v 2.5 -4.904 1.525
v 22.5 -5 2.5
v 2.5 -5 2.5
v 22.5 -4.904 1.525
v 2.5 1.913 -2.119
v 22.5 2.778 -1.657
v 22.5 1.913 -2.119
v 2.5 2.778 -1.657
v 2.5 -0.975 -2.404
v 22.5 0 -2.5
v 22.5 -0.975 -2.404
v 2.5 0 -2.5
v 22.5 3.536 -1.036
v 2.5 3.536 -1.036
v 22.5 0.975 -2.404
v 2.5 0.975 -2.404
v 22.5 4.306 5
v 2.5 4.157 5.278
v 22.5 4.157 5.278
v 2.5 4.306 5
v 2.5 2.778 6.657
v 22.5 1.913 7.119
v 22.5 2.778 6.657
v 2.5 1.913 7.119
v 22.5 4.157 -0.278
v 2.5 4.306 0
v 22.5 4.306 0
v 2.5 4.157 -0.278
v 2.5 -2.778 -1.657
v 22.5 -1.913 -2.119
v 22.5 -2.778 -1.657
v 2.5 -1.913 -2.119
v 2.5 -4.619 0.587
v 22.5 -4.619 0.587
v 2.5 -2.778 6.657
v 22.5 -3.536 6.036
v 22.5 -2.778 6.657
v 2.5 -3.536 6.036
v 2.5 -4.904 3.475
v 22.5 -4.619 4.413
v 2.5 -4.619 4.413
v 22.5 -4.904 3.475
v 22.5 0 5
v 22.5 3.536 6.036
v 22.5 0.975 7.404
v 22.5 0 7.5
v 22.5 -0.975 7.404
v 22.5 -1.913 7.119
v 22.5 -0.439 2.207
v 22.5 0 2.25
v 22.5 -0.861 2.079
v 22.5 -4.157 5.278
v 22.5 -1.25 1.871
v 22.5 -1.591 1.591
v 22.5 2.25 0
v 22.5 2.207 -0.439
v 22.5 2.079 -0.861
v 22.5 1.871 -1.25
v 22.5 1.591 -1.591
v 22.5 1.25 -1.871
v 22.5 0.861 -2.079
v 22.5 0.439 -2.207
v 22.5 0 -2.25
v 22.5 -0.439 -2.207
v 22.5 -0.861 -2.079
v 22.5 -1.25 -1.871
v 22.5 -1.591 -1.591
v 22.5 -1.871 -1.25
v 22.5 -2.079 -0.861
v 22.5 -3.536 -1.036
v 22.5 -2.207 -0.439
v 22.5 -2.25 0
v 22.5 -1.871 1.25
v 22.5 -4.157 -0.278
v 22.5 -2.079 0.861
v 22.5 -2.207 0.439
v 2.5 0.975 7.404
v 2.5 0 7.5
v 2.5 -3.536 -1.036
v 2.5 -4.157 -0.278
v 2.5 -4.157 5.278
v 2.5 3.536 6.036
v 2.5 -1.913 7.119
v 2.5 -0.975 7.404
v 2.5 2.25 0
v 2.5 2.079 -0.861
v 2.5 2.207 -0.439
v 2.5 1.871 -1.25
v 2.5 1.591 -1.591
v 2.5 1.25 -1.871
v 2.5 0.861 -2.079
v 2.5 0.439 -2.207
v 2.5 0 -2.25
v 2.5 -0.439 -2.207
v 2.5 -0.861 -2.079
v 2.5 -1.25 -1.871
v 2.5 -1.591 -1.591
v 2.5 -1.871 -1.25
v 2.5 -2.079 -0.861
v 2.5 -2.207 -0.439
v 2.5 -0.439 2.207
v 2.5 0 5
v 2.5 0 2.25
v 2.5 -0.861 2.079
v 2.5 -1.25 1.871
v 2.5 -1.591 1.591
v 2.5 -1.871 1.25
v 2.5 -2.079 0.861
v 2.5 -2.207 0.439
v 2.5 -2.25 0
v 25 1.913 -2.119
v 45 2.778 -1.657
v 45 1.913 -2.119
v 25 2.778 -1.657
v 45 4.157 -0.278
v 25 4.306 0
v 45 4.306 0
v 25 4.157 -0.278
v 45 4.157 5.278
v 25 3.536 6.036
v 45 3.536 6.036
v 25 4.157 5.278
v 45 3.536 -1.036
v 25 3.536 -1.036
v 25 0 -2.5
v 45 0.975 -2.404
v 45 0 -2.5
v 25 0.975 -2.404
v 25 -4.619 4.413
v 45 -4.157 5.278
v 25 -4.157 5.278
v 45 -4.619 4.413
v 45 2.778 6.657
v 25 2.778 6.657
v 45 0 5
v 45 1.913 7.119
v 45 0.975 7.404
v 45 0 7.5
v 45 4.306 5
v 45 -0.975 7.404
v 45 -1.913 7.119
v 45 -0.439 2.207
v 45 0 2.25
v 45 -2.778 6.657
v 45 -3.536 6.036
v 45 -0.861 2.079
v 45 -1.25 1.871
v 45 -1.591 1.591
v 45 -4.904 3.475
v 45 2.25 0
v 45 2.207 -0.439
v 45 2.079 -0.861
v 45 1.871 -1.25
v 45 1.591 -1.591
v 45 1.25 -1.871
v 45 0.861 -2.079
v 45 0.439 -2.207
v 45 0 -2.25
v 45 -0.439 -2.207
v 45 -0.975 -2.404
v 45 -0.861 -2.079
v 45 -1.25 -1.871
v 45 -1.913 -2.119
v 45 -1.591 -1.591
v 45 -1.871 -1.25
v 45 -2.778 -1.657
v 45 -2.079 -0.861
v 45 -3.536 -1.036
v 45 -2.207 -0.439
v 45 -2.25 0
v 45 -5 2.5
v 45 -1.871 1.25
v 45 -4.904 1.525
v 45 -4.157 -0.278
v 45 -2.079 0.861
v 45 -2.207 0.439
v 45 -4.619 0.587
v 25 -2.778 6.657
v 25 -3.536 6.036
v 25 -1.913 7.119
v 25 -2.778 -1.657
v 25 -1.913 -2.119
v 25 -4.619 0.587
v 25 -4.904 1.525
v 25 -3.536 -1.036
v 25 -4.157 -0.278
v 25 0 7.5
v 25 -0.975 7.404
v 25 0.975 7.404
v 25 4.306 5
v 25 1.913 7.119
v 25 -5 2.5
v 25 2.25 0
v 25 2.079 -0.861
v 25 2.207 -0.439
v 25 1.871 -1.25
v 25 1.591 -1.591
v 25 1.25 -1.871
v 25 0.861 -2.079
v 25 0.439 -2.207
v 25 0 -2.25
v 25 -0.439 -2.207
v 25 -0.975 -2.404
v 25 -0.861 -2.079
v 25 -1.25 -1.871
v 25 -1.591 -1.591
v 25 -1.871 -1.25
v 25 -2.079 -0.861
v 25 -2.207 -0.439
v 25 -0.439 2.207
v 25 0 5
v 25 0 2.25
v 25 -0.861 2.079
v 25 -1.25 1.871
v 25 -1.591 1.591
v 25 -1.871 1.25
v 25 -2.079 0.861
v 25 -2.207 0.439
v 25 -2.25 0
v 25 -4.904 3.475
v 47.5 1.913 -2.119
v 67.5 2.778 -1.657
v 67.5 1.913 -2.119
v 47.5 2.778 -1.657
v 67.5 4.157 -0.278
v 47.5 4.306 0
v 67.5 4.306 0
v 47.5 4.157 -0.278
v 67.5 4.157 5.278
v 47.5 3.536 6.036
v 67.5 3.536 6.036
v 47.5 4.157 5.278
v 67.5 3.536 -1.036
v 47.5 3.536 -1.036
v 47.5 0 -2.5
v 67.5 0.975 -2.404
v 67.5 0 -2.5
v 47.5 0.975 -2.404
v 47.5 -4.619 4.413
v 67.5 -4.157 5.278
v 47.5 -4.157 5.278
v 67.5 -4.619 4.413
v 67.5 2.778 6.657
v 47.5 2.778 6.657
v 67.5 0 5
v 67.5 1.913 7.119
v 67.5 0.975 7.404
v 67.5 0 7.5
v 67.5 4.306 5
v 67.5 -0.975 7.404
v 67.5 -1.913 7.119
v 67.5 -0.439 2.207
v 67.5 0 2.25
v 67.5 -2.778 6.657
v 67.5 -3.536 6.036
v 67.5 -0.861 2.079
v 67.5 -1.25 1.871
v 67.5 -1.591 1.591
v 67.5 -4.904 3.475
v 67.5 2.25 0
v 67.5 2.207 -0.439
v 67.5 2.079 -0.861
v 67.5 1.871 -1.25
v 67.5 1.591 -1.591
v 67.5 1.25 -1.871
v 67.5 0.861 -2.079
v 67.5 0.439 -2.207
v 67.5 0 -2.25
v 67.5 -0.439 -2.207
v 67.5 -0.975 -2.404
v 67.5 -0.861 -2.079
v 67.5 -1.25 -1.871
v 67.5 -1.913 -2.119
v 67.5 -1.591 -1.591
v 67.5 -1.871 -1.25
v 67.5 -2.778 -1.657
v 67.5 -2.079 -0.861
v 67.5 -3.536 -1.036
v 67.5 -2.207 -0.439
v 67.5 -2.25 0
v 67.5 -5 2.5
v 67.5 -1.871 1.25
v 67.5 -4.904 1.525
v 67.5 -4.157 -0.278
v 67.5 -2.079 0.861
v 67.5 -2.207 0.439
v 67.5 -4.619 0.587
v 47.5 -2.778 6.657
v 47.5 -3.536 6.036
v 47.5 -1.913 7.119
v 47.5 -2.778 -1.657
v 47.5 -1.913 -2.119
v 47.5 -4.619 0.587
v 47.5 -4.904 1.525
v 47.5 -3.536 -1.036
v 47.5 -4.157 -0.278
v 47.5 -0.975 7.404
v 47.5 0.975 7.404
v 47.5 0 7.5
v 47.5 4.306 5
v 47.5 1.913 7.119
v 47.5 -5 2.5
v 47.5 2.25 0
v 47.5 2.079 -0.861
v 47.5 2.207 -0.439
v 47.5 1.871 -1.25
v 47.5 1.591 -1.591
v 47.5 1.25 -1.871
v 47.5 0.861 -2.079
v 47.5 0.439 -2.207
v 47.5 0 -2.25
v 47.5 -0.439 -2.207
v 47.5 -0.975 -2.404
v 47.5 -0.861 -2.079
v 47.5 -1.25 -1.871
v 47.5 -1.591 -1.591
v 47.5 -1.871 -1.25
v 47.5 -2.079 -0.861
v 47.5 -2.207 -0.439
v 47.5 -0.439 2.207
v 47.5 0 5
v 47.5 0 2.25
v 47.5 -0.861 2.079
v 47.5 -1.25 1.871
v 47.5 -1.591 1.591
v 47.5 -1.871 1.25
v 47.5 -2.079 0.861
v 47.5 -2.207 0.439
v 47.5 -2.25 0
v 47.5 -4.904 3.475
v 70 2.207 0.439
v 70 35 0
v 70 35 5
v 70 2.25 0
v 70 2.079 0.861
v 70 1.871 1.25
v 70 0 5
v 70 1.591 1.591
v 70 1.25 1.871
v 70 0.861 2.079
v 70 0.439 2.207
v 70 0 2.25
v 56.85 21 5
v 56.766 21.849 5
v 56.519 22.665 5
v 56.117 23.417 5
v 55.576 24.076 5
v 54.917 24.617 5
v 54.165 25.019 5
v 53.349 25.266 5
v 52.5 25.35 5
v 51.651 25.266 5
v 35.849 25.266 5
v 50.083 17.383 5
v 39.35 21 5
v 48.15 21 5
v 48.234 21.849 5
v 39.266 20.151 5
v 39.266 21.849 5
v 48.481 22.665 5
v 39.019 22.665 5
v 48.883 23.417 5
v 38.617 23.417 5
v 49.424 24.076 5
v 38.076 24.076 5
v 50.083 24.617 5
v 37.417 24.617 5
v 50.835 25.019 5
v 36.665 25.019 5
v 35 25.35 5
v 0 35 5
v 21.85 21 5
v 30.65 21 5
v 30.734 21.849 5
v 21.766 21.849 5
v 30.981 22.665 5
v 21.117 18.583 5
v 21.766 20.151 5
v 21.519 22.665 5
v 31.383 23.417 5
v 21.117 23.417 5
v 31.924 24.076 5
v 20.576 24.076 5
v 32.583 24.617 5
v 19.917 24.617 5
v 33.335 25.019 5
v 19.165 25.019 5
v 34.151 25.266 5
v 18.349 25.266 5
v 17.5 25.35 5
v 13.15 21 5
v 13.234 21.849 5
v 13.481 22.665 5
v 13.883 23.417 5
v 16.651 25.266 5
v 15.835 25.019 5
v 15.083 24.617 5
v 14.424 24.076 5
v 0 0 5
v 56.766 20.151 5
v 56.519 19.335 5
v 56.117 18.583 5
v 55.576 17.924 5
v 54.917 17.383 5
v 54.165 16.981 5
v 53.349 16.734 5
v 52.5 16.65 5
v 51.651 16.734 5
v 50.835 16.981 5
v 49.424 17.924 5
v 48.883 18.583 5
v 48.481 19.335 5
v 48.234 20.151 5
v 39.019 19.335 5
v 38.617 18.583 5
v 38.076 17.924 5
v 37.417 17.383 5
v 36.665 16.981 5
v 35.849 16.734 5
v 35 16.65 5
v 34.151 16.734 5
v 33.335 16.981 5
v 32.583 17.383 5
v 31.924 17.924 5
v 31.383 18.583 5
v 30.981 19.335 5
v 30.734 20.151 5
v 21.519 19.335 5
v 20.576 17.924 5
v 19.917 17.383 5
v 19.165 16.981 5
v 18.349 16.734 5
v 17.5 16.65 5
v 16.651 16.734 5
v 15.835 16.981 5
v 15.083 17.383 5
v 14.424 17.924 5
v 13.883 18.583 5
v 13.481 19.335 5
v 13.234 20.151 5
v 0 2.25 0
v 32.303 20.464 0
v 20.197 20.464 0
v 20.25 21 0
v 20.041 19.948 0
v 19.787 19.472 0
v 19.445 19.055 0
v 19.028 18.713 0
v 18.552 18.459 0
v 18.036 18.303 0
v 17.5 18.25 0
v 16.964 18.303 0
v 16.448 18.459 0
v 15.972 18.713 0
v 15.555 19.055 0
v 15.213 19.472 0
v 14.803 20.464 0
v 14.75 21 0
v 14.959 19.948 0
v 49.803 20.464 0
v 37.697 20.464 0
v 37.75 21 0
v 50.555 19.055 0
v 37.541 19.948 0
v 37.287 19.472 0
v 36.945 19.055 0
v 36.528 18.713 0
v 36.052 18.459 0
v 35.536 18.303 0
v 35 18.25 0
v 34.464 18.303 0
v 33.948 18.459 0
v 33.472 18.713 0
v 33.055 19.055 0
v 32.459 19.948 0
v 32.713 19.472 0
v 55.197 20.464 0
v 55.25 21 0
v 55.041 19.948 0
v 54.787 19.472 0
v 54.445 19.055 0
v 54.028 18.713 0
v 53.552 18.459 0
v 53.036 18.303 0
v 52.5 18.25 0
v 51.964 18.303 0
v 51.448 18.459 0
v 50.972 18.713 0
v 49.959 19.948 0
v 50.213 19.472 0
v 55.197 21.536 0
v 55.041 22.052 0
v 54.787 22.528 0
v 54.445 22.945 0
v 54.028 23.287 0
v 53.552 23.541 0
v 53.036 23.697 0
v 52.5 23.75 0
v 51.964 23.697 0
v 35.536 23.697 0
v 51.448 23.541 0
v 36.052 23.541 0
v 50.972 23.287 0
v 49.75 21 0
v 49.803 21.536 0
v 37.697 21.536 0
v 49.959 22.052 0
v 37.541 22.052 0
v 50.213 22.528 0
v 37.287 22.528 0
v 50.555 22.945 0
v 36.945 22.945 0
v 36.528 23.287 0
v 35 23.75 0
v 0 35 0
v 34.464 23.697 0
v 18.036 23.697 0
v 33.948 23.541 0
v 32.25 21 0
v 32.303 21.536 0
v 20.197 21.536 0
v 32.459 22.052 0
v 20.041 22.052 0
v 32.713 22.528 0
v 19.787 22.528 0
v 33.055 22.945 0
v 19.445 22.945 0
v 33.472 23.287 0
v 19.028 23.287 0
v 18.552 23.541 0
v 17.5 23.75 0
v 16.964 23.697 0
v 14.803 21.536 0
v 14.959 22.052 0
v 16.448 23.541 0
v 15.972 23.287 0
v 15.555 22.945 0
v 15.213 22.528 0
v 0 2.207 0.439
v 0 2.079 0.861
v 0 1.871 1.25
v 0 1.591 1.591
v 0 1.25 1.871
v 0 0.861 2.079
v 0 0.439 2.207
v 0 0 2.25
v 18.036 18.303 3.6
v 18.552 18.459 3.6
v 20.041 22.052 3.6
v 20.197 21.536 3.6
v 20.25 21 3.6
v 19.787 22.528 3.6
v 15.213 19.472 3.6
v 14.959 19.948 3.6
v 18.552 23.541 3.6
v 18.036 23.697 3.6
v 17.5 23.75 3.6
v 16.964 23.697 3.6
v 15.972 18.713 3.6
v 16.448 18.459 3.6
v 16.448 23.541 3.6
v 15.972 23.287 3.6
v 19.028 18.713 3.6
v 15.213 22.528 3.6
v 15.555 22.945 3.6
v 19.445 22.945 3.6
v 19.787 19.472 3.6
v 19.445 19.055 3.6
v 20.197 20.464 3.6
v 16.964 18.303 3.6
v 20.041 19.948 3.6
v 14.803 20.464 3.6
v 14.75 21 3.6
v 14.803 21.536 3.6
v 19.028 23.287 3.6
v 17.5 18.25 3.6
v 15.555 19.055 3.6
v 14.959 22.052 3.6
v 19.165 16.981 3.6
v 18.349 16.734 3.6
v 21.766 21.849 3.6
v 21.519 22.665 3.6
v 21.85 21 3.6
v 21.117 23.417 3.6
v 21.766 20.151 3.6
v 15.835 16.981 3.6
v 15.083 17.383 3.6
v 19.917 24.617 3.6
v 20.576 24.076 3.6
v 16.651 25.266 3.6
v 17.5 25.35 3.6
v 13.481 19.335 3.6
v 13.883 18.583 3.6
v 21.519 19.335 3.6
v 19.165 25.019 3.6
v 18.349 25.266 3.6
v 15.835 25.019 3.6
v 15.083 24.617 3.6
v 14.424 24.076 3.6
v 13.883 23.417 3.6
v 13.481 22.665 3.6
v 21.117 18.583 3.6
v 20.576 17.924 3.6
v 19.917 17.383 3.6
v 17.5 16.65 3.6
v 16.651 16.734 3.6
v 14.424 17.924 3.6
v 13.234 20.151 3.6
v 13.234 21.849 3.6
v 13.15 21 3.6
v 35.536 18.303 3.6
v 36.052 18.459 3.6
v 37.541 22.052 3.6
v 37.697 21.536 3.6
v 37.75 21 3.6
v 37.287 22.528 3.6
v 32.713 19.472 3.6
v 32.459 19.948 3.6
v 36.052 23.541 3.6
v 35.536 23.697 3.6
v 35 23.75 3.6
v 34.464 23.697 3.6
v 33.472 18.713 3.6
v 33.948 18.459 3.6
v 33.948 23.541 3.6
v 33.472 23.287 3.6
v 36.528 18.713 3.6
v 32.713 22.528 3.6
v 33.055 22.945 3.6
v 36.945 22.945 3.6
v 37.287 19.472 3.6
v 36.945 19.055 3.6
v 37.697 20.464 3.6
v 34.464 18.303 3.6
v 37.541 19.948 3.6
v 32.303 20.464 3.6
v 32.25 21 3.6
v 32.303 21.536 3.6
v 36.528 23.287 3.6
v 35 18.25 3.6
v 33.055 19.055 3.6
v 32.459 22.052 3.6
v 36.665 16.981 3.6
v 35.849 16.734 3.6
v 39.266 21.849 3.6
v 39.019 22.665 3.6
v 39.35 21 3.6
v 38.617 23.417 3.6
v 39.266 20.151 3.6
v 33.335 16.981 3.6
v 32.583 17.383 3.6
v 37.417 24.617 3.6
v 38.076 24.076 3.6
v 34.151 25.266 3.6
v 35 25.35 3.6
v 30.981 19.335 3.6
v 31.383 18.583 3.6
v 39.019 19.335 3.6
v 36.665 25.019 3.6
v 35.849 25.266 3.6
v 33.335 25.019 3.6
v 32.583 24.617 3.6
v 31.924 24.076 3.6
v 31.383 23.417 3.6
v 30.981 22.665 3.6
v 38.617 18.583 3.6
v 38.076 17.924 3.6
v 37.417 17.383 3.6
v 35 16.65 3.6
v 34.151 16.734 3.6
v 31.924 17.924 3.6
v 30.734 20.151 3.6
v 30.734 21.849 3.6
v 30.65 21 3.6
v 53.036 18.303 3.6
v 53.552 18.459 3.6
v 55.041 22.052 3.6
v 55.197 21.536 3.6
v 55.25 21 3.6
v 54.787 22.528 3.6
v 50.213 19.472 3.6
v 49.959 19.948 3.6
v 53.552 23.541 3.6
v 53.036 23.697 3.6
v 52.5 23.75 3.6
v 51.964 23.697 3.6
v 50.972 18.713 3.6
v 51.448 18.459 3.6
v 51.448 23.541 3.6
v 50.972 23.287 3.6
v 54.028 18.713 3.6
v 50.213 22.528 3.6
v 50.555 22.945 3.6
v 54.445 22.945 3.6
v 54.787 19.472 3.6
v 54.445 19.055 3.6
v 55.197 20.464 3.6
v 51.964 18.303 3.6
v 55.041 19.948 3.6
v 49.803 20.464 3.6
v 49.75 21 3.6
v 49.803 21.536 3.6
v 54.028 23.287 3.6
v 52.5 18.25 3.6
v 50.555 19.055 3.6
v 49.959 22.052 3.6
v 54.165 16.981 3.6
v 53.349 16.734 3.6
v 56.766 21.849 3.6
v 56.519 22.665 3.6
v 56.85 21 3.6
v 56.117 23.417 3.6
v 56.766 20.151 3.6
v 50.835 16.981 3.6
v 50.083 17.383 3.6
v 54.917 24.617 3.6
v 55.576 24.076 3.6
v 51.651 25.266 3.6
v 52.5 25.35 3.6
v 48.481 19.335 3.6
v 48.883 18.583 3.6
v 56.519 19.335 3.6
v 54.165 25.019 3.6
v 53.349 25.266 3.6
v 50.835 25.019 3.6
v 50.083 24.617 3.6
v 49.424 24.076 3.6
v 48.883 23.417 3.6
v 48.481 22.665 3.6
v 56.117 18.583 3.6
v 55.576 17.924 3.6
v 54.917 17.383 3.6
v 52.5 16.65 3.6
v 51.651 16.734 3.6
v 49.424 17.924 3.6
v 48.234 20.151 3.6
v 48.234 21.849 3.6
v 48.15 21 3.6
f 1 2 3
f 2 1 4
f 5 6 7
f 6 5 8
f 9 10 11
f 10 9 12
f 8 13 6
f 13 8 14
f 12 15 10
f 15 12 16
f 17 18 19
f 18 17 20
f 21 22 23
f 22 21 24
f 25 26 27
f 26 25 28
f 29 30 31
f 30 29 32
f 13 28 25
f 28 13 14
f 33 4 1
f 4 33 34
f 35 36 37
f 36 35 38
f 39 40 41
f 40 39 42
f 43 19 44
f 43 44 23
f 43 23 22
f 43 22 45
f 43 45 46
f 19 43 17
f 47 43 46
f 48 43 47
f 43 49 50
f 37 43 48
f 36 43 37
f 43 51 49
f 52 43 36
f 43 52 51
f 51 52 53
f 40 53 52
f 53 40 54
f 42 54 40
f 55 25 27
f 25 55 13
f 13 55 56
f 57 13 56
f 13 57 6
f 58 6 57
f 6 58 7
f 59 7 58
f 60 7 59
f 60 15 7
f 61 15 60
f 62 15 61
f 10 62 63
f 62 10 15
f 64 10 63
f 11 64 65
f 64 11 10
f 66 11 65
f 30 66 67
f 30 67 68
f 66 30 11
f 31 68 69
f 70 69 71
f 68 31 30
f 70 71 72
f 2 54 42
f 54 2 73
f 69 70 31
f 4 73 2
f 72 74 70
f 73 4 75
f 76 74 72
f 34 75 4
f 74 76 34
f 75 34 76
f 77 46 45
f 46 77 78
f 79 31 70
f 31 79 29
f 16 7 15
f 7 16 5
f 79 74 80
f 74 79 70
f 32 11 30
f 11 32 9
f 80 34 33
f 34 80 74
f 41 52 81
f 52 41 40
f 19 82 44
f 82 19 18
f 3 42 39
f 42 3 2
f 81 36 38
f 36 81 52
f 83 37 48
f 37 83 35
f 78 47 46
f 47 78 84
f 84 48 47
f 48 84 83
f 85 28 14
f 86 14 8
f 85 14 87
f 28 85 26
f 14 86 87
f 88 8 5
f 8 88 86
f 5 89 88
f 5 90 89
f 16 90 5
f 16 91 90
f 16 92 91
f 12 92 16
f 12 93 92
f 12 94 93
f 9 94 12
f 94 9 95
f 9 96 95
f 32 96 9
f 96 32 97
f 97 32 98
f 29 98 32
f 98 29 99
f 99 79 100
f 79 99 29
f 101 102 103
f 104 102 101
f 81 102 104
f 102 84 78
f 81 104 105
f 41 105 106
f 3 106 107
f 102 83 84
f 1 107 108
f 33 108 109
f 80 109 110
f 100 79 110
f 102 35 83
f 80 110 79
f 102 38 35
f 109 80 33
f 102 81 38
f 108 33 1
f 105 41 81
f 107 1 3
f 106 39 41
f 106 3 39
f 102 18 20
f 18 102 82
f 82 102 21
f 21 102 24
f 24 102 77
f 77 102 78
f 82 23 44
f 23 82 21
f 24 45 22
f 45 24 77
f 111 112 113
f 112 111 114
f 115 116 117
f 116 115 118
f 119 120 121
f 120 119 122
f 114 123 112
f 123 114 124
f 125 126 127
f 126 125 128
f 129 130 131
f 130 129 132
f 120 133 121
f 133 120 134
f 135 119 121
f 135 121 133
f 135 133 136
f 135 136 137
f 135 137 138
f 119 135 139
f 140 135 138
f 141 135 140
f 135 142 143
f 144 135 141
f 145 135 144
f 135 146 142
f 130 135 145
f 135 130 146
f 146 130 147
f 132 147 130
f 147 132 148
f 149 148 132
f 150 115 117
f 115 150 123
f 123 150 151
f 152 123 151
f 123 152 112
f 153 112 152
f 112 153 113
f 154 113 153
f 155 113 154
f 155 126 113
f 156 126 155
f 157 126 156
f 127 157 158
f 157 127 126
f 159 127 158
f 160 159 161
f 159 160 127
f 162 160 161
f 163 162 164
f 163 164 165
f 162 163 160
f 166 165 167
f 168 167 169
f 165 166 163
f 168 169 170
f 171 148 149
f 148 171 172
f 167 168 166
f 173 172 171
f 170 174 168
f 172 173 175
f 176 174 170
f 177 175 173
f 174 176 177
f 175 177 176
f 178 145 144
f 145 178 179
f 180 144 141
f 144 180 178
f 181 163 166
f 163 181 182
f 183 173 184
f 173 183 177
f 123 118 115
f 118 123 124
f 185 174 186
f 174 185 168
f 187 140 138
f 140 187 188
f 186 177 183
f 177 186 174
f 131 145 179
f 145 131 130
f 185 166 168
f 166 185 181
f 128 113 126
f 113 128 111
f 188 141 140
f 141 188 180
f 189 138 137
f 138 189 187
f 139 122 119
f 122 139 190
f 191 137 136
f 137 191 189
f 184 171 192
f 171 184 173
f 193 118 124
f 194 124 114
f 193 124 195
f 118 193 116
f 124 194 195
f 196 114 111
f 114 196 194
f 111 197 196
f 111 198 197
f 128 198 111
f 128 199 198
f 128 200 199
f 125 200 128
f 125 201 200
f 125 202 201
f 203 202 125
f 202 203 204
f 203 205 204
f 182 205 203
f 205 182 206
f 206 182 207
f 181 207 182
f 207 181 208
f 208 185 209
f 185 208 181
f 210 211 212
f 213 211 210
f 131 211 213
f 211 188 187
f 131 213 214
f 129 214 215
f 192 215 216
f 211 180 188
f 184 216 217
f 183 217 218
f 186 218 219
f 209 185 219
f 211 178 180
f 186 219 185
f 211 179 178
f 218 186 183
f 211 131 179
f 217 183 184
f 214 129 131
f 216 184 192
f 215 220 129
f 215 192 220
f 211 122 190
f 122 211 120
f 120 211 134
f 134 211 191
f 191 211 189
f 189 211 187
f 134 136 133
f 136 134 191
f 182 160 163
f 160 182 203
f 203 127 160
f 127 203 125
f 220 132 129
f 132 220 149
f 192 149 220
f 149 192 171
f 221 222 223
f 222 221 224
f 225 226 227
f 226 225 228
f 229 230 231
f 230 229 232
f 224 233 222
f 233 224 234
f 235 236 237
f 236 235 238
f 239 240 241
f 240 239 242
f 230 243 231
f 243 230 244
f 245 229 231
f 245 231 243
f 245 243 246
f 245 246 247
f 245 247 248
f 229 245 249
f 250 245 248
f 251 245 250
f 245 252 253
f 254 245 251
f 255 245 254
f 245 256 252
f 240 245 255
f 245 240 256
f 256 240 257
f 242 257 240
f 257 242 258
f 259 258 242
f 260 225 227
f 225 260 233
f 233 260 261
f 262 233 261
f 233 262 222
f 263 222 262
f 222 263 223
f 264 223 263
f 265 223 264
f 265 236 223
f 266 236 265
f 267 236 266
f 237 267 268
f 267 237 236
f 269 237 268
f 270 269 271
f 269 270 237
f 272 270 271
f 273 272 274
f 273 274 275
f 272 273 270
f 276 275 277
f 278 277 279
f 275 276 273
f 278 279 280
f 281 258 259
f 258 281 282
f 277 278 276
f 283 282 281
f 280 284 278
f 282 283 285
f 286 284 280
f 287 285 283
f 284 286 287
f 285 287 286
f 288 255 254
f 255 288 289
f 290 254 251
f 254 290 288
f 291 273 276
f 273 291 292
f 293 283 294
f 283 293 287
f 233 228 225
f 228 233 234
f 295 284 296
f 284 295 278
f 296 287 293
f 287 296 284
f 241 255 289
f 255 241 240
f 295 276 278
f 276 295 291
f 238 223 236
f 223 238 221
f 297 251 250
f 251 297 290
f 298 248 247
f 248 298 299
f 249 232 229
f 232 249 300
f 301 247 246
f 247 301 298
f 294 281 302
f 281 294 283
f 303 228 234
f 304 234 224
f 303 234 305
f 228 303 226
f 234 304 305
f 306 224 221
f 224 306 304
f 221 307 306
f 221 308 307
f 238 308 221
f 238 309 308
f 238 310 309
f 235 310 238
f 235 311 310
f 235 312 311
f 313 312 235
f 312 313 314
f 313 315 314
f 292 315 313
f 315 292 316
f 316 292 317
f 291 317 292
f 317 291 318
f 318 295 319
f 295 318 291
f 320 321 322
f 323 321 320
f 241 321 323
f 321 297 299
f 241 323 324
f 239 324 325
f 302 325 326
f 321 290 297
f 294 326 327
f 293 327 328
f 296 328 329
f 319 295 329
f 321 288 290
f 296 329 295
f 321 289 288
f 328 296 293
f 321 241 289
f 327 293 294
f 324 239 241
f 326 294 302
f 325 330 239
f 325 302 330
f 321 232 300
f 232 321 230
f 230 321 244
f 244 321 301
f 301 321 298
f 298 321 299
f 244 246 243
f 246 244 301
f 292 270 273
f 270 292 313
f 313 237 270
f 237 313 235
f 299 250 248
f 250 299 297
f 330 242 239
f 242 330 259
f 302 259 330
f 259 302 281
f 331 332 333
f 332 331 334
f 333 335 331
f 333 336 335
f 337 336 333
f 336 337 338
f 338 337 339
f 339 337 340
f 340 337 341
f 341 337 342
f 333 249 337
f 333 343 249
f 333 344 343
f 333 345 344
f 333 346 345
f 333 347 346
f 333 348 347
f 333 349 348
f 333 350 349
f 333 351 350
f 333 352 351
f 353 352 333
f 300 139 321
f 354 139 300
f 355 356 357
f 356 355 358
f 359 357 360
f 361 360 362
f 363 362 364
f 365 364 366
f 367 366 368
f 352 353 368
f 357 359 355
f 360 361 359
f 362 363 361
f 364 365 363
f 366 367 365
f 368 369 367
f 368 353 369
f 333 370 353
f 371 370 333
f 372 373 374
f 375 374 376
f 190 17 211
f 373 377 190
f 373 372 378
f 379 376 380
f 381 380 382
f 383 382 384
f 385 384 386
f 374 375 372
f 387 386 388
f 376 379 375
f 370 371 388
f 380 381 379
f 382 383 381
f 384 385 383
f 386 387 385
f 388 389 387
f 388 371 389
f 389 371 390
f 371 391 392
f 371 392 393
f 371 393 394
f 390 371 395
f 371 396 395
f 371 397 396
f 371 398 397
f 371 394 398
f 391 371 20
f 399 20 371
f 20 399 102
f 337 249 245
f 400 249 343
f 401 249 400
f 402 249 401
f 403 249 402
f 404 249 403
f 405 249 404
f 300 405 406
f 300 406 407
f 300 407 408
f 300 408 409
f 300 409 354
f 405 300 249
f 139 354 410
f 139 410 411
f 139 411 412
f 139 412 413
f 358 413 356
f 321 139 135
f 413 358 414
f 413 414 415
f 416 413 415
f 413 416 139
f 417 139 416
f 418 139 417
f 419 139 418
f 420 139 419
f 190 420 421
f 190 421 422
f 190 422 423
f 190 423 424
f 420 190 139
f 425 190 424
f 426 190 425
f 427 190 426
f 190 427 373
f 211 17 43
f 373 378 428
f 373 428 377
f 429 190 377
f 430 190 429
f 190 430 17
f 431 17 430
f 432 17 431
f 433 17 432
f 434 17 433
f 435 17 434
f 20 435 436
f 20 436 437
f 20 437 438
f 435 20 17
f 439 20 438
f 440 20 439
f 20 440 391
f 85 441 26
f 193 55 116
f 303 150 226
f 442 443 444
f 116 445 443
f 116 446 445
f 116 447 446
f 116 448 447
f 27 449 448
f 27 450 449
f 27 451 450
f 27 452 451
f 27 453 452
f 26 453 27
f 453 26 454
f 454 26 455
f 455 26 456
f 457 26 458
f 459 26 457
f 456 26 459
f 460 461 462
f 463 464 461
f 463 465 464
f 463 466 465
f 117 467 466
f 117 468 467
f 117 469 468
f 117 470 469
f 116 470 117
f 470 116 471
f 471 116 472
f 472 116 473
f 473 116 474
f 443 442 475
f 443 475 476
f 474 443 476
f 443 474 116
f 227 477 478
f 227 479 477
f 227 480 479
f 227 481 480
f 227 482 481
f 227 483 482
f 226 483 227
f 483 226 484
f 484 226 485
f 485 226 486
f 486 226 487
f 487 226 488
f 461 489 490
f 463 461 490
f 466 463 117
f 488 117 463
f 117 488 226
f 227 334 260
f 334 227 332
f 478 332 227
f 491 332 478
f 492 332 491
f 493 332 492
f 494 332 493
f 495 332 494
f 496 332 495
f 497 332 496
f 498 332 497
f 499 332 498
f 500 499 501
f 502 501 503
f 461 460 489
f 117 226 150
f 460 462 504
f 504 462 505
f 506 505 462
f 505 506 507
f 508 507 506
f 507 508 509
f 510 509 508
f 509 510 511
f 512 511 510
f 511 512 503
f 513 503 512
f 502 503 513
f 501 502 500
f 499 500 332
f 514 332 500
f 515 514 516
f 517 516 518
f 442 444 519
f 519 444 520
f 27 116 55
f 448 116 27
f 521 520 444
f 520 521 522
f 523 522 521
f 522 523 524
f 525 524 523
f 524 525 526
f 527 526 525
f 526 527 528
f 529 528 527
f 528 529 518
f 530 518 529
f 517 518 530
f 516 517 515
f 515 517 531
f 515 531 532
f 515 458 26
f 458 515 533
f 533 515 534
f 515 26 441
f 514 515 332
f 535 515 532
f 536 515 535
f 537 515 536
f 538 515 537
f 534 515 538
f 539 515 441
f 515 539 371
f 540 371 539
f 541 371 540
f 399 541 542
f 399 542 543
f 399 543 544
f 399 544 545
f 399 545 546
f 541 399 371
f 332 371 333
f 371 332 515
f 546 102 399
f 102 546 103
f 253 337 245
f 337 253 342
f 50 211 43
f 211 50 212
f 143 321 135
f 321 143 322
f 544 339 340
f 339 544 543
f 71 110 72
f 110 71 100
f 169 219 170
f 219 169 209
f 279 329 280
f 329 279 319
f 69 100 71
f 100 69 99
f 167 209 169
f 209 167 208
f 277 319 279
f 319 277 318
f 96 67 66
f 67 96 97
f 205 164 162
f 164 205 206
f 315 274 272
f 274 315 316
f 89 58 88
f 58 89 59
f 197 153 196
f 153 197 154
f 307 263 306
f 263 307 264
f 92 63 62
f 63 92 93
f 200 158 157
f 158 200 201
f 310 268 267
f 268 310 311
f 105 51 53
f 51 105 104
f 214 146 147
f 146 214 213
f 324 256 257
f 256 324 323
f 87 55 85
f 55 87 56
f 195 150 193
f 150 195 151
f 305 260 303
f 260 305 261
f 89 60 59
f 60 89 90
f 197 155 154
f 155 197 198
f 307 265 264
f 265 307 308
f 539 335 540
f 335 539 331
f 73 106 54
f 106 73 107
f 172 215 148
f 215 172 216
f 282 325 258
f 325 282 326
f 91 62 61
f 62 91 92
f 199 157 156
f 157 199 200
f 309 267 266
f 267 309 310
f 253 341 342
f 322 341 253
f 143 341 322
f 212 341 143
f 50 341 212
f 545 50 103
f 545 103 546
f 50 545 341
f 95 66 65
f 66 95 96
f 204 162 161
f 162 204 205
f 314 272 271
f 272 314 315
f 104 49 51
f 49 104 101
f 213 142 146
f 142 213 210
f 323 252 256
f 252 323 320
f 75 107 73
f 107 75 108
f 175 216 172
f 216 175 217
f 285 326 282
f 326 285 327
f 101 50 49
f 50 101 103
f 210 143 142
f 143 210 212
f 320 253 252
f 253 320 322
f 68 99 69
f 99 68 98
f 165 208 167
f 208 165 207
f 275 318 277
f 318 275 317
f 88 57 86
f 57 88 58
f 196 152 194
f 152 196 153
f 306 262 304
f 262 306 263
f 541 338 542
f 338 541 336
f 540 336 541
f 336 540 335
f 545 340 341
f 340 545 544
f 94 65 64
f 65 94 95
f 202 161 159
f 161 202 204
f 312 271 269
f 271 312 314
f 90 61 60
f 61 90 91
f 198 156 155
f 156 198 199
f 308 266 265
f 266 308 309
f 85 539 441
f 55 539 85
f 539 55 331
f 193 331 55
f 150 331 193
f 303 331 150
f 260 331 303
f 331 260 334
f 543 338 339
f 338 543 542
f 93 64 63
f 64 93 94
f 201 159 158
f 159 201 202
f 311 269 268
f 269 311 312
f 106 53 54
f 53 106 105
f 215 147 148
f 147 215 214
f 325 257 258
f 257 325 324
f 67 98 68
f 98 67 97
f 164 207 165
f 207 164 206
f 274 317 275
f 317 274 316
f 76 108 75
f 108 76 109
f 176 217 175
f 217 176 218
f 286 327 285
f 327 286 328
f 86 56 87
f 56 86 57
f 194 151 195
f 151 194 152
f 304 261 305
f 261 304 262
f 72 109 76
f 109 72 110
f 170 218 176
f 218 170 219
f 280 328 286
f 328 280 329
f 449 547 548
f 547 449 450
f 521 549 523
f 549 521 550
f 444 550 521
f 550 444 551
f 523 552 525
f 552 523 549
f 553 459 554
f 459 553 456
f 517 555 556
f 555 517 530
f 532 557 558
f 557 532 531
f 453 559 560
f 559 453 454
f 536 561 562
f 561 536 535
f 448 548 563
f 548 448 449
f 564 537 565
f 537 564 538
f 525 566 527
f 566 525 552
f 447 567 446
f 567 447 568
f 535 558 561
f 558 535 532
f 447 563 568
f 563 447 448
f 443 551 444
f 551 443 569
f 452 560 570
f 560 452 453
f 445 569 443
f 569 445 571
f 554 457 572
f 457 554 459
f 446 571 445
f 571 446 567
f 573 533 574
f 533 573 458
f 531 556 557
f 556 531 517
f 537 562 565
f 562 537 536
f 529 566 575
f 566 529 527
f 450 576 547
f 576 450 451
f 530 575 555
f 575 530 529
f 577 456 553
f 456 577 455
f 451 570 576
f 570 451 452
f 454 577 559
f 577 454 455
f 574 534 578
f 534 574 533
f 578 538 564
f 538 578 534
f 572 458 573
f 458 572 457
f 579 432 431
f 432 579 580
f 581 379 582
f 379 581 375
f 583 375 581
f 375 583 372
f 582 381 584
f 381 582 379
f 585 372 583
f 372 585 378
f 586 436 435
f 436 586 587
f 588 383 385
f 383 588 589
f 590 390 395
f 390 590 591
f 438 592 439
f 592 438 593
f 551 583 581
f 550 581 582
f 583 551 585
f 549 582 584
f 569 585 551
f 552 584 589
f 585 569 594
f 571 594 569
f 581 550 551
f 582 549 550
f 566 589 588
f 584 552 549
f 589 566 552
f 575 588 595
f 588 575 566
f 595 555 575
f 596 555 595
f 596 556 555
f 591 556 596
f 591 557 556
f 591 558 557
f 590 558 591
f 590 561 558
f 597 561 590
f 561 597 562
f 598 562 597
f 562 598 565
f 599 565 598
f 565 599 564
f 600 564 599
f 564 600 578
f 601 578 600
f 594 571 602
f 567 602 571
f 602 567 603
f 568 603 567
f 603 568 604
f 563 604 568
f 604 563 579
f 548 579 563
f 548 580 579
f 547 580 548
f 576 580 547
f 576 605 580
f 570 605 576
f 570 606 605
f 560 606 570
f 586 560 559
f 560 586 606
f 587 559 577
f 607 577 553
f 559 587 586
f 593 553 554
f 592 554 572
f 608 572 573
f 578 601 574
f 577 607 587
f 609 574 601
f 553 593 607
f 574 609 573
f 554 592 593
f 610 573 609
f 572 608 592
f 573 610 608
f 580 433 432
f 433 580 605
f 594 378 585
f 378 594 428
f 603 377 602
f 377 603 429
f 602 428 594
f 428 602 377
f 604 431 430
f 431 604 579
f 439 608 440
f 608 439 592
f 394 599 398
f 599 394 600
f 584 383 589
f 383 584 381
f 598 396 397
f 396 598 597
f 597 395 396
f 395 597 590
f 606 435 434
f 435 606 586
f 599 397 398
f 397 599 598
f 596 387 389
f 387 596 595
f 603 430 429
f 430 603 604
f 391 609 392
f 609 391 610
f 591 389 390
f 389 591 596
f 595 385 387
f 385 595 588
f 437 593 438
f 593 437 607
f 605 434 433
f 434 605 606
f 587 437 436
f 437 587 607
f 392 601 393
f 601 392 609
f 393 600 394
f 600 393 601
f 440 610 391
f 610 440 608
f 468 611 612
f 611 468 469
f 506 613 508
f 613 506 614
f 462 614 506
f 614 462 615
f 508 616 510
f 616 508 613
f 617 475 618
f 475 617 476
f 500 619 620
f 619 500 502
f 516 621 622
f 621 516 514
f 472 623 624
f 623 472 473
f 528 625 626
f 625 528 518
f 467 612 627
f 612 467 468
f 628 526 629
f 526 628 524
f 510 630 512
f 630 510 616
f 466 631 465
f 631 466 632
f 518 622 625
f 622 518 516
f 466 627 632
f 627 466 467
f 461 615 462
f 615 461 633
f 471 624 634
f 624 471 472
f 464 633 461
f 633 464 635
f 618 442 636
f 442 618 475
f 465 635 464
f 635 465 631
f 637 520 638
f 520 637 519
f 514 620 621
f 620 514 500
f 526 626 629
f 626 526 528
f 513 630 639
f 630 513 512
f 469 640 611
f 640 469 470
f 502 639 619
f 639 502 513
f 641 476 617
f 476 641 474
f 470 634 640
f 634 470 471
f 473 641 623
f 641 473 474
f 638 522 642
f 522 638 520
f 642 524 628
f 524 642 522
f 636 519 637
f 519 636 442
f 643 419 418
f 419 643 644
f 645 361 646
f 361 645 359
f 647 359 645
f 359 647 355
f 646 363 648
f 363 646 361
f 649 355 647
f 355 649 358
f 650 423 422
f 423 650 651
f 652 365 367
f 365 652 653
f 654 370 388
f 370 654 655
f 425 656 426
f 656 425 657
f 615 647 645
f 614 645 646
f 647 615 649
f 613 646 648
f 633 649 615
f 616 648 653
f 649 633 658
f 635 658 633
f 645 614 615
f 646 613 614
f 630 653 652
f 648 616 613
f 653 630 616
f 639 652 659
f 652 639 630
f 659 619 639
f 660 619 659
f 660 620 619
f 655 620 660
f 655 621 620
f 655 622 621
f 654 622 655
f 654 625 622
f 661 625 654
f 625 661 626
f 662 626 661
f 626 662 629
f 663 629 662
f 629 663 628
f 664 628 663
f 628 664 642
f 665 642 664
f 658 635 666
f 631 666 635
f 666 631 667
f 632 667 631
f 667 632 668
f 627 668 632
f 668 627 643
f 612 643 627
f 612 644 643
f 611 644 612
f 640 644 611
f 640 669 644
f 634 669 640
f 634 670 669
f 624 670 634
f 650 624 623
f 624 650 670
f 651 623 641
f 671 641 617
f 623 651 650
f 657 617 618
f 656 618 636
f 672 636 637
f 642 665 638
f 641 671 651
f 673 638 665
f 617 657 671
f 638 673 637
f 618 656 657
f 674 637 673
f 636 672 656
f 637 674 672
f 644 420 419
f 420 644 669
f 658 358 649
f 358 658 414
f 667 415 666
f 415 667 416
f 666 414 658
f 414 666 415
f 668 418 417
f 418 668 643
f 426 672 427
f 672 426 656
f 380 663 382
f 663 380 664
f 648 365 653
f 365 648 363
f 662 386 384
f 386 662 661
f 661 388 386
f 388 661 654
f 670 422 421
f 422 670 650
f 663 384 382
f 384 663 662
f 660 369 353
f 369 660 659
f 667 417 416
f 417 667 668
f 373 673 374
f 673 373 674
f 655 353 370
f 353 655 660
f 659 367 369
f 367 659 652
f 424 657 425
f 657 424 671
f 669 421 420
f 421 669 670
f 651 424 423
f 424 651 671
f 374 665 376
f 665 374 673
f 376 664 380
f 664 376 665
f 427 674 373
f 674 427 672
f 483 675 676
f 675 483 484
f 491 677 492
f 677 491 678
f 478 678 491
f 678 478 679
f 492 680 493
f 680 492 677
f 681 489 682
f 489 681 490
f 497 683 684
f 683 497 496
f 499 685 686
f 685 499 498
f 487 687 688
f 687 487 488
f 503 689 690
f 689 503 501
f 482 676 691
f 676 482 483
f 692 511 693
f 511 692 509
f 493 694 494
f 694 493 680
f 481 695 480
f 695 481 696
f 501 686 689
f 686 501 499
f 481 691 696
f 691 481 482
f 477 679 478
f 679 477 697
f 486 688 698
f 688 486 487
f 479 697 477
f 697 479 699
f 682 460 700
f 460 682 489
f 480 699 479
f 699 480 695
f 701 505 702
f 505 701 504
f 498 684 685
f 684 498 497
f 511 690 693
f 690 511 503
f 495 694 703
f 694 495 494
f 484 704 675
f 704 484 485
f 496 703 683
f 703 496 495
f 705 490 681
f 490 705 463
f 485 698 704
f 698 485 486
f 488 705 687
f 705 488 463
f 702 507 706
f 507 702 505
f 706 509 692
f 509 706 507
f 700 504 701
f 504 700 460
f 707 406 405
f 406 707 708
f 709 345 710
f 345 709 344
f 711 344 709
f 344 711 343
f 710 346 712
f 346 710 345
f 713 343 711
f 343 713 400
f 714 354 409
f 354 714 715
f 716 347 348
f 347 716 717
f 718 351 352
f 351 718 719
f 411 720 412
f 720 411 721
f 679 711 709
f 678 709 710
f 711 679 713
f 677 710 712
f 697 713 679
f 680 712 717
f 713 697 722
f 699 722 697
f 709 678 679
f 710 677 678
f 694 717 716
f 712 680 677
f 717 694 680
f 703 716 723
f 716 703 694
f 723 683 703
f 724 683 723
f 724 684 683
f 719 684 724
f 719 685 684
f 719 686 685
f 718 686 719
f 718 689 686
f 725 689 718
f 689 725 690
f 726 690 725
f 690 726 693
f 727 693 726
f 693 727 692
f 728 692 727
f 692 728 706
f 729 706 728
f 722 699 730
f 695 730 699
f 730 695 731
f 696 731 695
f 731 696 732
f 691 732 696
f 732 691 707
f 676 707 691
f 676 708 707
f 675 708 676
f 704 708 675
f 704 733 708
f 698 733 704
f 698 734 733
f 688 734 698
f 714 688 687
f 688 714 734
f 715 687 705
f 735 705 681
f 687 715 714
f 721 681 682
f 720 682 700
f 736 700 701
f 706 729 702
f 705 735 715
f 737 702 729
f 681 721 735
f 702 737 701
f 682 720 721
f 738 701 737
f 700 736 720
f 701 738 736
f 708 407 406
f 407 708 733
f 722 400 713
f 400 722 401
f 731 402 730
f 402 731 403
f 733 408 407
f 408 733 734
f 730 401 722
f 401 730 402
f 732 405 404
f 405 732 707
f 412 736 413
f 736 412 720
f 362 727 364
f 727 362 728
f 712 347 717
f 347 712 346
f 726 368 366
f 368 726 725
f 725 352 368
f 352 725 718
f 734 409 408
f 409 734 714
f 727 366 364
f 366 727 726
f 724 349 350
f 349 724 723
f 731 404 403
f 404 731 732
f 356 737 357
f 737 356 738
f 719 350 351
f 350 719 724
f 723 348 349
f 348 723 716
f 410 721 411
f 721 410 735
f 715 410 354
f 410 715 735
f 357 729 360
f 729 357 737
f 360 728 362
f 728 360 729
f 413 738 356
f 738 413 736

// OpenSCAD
$fn = 32;

// ----------------------------------------------------------------------
// Hinge leaf: 70 x 40 x 10 mm
// ----------------------------------------------------------------------

// --- parameters (mm) ---
leaf_len = 70;            // leaf length, X
leaf_w = 35;              // leaf width, Y
leaf_t = 5;               // leaf thickness
knuckle_d = 10;           // knuckle diameter
knuckle_w = 20;           // knuckle width
knuckle_n = 3;            // number of knuckles
pin_d = 4.5;              // pin bore
gap = 2.5;                // gap between the knuckles
screw_d = 5.5;            // screw clearance
cs_d = 8.7;               // countersink diameter
cs_h = 1.4;               // countersink depth

module leaf() {
  cube([leaf_len, leaf_w, leaf_t]);
}

module knuckles() {
  /* barrels sit on the leaf edge, the pin axis at half the leaf thickness */
  for (i = [0 : knuckle_n - 1])
    translate([gap + i * (knuckle_w + gap), 0, leaf_t * 0.5])
      rotate([0, 90, 0]) cylinder(h = knuckle_w, d = knuckle_d);
}

difference() {
  union() {
    leaf();
    knuckles();
  }
  rotate([0, 90, 0]) translate([0, 0, -1])
    cylinder(h = leaf_len + 2, d = pin_d);
  translate([17.5, leaf_w * 0.6, -1]) cylinder(h = leaf_t + 2, d = screw_d);
  translate([17.5, leaf_w * 0.6, leaf_t - cs_h]) cylinder(h = cs_h + 0.5, d = cs_d);
  translate([35, leaf_w * 0.6, -1]) cylinder(h = leaf_t + 2, d = screw_d);
  translate([35, leaf_w * 0.6, leaf_t - cs_h]) cylinder(h = cs_h + 0.5, d = cs_d);
  translate([52.5, leaf_w * 0.6, -1]) cylinder(h = leaf_t + 2, d = screw_d);
  translate([52.5, leaf_w * 0.6, leaf_t - cs_h]) cylinder(h = cs_h + 0.5, d = cs_d);
}
